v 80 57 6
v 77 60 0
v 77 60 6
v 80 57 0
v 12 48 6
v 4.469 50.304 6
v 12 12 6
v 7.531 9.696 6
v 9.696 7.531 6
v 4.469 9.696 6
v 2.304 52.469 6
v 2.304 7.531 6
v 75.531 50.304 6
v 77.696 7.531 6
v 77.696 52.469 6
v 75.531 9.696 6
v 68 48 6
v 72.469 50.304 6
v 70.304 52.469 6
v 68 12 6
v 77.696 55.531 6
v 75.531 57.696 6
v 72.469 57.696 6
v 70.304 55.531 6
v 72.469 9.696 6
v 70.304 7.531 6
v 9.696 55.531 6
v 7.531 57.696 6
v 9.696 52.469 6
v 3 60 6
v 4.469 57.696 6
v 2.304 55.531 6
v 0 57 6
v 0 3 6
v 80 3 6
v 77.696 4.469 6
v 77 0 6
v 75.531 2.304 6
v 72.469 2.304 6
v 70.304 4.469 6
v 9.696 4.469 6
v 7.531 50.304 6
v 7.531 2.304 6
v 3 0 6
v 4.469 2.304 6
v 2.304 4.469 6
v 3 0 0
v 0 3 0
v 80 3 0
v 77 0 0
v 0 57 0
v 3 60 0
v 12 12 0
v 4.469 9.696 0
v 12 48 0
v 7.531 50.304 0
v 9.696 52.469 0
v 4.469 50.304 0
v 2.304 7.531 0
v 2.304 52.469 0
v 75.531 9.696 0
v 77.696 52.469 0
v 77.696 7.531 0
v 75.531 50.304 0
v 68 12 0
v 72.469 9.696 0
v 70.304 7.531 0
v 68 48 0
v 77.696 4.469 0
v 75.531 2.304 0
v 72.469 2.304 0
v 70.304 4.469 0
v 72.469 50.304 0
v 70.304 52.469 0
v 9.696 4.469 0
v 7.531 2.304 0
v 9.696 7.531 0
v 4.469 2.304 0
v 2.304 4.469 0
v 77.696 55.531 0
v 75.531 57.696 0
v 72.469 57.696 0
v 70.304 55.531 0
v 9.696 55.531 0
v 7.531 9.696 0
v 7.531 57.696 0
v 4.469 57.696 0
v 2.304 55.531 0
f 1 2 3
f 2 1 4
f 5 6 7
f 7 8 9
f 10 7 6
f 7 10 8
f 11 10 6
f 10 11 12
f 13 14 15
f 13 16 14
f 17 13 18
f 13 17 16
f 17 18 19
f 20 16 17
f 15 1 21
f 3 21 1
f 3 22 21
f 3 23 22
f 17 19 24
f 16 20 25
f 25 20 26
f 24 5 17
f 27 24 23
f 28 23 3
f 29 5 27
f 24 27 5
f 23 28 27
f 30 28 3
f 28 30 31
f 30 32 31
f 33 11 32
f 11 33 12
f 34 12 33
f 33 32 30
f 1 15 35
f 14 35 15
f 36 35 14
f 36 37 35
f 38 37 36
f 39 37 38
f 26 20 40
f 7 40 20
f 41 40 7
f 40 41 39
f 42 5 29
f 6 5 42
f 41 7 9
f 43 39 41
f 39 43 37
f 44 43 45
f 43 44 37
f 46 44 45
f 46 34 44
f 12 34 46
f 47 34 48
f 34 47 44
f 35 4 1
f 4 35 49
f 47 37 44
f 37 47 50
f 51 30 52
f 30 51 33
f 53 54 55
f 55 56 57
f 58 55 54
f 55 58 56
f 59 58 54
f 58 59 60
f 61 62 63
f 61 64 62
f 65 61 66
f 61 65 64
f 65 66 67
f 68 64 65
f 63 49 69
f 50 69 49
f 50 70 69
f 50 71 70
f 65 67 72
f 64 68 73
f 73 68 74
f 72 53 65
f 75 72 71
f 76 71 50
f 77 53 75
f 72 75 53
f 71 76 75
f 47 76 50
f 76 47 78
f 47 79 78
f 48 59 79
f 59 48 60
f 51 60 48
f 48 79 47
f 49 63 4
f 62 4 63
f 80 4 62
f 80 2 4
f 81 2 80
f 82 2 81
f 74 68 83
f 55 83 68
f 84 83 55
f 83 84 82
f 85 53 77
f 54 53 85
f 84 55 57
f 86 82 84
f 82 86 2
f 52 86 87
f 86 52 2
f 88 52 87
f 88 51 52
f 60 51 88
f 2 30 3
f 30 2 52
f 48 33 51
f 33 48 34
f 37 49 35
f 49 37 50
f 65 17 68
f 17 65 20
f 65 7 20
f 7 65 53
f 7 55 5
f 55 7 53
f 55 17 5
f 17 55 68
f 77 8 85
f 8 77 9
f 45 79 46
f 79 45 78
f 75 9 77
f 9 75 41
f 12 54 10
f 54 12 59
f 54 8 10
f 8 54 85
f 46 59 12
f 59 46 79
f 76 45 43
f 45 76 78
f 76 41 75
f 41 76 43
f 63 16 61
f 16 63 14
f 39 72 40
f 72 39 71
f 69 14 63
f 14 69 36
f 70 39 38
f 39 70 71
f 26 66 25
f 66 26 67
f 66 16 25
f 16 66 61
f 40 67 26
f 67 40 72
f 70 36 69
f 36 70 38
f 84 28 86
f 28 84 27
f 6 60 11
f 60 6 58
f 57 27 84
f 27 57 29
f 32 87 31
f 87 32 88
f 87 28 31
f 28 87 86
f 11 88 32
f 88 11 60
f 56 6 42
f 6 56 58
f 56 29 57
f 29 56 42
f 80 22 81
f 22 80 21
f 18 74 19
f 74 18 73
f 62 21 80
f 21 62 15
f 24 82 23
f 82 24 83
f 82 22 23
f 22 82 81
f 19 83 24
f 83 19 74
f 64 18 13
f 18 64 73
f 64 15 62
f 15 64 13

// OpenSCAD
$fn = 32;

// ----------------------------------------------------------------------
// Frame plate: 80 x 60 frame, 12 mm rails
// ----------------------------------------------------------------------

// --- parameters (mm) ---
plate_l = 80;             // plate length, X
plate_w = 60;             // plate width, Y
plate_t = 6;              // plate thickness, Z (extrusion height)
corner_c = 3;             // corner chamfer
frame_bar = 12;           // frame rail width
bolt_r = 4;               // corner bolt window radius
bolt_inset = 6;           // bolt centre inset from the edges

win_l = plate_l - 2 * frame_bar;  // window length
win_w = plate_w - 2 * frame_bar;  // window width
bolt_d = 2 * bolt_r;  // corner hole diameter

profile = [[3, 0], [77, 0], [80, 3], [80, 57], [77, 60], [3, 60], [0, 57], [0, 3]];  // primary outline, 8 points, counter clockwise
void_1 = [[12, 12], [68, 12], [68, 48], [12, 48]];  // the window, 4 points
void_2 = [[9.696, 7.531], [7.531, 9.696], [4.469, 9.696], [2.304, 7.531], [2.304, 4.469], [4.469, 2.304], [7.531, 2.304], [9.696, 4.469]];  // corner bolt window, 8 points
void_3 = [[77.696, 7.531], [75.531, 9.696], [72.469, 9.696], [70.304, 7.531], [70.304, 4.469], [72.469, 2.304], [75.531, 2.304], [77.696, 4.469]];  // corner bolt window, 8 points
void_4 = [[9.696, 55.531], [7.531, 57.696], [4.469, 57.696], [2.304, 55.531], [2.304, 52.469], [4.469, 50.304], [7.531, 50.304], [9.696, 52.469]];  // corner bolt window, 8 points
void_5 = [[77.696, 55.531], [75.531, 57.696], [72.469, 57.696], [70.304, 55.531], [70.304, 52.469], [72.469, 50.304], [75.531, 50.304], [77.696, 52.469]];  // corner bolt window, 8 points

// --- the one profile operation ---
difference() {
  linear_extrude(height = plate_t) polygon(points = profile);
  translate([0, 0, -1])
    linear_extrude(height = plate_t + 2) polygon(points = void_1);
  translate([0, 0, -1])
    linear_extrude(height = plate_t + 2) polygon(points = void_2);
  translate([0, 0, -1])
    linear_extrude(height = plate_t + 2) polygon(points = void_3);
  translate([0, 0, -1])
    linear_extrude(height = plate_t + 2) polygon(points = void_4);
  translate([0, 0, -1])
    linear_extrude(height = plate_t + 2) polygon(points = void_5);
}
